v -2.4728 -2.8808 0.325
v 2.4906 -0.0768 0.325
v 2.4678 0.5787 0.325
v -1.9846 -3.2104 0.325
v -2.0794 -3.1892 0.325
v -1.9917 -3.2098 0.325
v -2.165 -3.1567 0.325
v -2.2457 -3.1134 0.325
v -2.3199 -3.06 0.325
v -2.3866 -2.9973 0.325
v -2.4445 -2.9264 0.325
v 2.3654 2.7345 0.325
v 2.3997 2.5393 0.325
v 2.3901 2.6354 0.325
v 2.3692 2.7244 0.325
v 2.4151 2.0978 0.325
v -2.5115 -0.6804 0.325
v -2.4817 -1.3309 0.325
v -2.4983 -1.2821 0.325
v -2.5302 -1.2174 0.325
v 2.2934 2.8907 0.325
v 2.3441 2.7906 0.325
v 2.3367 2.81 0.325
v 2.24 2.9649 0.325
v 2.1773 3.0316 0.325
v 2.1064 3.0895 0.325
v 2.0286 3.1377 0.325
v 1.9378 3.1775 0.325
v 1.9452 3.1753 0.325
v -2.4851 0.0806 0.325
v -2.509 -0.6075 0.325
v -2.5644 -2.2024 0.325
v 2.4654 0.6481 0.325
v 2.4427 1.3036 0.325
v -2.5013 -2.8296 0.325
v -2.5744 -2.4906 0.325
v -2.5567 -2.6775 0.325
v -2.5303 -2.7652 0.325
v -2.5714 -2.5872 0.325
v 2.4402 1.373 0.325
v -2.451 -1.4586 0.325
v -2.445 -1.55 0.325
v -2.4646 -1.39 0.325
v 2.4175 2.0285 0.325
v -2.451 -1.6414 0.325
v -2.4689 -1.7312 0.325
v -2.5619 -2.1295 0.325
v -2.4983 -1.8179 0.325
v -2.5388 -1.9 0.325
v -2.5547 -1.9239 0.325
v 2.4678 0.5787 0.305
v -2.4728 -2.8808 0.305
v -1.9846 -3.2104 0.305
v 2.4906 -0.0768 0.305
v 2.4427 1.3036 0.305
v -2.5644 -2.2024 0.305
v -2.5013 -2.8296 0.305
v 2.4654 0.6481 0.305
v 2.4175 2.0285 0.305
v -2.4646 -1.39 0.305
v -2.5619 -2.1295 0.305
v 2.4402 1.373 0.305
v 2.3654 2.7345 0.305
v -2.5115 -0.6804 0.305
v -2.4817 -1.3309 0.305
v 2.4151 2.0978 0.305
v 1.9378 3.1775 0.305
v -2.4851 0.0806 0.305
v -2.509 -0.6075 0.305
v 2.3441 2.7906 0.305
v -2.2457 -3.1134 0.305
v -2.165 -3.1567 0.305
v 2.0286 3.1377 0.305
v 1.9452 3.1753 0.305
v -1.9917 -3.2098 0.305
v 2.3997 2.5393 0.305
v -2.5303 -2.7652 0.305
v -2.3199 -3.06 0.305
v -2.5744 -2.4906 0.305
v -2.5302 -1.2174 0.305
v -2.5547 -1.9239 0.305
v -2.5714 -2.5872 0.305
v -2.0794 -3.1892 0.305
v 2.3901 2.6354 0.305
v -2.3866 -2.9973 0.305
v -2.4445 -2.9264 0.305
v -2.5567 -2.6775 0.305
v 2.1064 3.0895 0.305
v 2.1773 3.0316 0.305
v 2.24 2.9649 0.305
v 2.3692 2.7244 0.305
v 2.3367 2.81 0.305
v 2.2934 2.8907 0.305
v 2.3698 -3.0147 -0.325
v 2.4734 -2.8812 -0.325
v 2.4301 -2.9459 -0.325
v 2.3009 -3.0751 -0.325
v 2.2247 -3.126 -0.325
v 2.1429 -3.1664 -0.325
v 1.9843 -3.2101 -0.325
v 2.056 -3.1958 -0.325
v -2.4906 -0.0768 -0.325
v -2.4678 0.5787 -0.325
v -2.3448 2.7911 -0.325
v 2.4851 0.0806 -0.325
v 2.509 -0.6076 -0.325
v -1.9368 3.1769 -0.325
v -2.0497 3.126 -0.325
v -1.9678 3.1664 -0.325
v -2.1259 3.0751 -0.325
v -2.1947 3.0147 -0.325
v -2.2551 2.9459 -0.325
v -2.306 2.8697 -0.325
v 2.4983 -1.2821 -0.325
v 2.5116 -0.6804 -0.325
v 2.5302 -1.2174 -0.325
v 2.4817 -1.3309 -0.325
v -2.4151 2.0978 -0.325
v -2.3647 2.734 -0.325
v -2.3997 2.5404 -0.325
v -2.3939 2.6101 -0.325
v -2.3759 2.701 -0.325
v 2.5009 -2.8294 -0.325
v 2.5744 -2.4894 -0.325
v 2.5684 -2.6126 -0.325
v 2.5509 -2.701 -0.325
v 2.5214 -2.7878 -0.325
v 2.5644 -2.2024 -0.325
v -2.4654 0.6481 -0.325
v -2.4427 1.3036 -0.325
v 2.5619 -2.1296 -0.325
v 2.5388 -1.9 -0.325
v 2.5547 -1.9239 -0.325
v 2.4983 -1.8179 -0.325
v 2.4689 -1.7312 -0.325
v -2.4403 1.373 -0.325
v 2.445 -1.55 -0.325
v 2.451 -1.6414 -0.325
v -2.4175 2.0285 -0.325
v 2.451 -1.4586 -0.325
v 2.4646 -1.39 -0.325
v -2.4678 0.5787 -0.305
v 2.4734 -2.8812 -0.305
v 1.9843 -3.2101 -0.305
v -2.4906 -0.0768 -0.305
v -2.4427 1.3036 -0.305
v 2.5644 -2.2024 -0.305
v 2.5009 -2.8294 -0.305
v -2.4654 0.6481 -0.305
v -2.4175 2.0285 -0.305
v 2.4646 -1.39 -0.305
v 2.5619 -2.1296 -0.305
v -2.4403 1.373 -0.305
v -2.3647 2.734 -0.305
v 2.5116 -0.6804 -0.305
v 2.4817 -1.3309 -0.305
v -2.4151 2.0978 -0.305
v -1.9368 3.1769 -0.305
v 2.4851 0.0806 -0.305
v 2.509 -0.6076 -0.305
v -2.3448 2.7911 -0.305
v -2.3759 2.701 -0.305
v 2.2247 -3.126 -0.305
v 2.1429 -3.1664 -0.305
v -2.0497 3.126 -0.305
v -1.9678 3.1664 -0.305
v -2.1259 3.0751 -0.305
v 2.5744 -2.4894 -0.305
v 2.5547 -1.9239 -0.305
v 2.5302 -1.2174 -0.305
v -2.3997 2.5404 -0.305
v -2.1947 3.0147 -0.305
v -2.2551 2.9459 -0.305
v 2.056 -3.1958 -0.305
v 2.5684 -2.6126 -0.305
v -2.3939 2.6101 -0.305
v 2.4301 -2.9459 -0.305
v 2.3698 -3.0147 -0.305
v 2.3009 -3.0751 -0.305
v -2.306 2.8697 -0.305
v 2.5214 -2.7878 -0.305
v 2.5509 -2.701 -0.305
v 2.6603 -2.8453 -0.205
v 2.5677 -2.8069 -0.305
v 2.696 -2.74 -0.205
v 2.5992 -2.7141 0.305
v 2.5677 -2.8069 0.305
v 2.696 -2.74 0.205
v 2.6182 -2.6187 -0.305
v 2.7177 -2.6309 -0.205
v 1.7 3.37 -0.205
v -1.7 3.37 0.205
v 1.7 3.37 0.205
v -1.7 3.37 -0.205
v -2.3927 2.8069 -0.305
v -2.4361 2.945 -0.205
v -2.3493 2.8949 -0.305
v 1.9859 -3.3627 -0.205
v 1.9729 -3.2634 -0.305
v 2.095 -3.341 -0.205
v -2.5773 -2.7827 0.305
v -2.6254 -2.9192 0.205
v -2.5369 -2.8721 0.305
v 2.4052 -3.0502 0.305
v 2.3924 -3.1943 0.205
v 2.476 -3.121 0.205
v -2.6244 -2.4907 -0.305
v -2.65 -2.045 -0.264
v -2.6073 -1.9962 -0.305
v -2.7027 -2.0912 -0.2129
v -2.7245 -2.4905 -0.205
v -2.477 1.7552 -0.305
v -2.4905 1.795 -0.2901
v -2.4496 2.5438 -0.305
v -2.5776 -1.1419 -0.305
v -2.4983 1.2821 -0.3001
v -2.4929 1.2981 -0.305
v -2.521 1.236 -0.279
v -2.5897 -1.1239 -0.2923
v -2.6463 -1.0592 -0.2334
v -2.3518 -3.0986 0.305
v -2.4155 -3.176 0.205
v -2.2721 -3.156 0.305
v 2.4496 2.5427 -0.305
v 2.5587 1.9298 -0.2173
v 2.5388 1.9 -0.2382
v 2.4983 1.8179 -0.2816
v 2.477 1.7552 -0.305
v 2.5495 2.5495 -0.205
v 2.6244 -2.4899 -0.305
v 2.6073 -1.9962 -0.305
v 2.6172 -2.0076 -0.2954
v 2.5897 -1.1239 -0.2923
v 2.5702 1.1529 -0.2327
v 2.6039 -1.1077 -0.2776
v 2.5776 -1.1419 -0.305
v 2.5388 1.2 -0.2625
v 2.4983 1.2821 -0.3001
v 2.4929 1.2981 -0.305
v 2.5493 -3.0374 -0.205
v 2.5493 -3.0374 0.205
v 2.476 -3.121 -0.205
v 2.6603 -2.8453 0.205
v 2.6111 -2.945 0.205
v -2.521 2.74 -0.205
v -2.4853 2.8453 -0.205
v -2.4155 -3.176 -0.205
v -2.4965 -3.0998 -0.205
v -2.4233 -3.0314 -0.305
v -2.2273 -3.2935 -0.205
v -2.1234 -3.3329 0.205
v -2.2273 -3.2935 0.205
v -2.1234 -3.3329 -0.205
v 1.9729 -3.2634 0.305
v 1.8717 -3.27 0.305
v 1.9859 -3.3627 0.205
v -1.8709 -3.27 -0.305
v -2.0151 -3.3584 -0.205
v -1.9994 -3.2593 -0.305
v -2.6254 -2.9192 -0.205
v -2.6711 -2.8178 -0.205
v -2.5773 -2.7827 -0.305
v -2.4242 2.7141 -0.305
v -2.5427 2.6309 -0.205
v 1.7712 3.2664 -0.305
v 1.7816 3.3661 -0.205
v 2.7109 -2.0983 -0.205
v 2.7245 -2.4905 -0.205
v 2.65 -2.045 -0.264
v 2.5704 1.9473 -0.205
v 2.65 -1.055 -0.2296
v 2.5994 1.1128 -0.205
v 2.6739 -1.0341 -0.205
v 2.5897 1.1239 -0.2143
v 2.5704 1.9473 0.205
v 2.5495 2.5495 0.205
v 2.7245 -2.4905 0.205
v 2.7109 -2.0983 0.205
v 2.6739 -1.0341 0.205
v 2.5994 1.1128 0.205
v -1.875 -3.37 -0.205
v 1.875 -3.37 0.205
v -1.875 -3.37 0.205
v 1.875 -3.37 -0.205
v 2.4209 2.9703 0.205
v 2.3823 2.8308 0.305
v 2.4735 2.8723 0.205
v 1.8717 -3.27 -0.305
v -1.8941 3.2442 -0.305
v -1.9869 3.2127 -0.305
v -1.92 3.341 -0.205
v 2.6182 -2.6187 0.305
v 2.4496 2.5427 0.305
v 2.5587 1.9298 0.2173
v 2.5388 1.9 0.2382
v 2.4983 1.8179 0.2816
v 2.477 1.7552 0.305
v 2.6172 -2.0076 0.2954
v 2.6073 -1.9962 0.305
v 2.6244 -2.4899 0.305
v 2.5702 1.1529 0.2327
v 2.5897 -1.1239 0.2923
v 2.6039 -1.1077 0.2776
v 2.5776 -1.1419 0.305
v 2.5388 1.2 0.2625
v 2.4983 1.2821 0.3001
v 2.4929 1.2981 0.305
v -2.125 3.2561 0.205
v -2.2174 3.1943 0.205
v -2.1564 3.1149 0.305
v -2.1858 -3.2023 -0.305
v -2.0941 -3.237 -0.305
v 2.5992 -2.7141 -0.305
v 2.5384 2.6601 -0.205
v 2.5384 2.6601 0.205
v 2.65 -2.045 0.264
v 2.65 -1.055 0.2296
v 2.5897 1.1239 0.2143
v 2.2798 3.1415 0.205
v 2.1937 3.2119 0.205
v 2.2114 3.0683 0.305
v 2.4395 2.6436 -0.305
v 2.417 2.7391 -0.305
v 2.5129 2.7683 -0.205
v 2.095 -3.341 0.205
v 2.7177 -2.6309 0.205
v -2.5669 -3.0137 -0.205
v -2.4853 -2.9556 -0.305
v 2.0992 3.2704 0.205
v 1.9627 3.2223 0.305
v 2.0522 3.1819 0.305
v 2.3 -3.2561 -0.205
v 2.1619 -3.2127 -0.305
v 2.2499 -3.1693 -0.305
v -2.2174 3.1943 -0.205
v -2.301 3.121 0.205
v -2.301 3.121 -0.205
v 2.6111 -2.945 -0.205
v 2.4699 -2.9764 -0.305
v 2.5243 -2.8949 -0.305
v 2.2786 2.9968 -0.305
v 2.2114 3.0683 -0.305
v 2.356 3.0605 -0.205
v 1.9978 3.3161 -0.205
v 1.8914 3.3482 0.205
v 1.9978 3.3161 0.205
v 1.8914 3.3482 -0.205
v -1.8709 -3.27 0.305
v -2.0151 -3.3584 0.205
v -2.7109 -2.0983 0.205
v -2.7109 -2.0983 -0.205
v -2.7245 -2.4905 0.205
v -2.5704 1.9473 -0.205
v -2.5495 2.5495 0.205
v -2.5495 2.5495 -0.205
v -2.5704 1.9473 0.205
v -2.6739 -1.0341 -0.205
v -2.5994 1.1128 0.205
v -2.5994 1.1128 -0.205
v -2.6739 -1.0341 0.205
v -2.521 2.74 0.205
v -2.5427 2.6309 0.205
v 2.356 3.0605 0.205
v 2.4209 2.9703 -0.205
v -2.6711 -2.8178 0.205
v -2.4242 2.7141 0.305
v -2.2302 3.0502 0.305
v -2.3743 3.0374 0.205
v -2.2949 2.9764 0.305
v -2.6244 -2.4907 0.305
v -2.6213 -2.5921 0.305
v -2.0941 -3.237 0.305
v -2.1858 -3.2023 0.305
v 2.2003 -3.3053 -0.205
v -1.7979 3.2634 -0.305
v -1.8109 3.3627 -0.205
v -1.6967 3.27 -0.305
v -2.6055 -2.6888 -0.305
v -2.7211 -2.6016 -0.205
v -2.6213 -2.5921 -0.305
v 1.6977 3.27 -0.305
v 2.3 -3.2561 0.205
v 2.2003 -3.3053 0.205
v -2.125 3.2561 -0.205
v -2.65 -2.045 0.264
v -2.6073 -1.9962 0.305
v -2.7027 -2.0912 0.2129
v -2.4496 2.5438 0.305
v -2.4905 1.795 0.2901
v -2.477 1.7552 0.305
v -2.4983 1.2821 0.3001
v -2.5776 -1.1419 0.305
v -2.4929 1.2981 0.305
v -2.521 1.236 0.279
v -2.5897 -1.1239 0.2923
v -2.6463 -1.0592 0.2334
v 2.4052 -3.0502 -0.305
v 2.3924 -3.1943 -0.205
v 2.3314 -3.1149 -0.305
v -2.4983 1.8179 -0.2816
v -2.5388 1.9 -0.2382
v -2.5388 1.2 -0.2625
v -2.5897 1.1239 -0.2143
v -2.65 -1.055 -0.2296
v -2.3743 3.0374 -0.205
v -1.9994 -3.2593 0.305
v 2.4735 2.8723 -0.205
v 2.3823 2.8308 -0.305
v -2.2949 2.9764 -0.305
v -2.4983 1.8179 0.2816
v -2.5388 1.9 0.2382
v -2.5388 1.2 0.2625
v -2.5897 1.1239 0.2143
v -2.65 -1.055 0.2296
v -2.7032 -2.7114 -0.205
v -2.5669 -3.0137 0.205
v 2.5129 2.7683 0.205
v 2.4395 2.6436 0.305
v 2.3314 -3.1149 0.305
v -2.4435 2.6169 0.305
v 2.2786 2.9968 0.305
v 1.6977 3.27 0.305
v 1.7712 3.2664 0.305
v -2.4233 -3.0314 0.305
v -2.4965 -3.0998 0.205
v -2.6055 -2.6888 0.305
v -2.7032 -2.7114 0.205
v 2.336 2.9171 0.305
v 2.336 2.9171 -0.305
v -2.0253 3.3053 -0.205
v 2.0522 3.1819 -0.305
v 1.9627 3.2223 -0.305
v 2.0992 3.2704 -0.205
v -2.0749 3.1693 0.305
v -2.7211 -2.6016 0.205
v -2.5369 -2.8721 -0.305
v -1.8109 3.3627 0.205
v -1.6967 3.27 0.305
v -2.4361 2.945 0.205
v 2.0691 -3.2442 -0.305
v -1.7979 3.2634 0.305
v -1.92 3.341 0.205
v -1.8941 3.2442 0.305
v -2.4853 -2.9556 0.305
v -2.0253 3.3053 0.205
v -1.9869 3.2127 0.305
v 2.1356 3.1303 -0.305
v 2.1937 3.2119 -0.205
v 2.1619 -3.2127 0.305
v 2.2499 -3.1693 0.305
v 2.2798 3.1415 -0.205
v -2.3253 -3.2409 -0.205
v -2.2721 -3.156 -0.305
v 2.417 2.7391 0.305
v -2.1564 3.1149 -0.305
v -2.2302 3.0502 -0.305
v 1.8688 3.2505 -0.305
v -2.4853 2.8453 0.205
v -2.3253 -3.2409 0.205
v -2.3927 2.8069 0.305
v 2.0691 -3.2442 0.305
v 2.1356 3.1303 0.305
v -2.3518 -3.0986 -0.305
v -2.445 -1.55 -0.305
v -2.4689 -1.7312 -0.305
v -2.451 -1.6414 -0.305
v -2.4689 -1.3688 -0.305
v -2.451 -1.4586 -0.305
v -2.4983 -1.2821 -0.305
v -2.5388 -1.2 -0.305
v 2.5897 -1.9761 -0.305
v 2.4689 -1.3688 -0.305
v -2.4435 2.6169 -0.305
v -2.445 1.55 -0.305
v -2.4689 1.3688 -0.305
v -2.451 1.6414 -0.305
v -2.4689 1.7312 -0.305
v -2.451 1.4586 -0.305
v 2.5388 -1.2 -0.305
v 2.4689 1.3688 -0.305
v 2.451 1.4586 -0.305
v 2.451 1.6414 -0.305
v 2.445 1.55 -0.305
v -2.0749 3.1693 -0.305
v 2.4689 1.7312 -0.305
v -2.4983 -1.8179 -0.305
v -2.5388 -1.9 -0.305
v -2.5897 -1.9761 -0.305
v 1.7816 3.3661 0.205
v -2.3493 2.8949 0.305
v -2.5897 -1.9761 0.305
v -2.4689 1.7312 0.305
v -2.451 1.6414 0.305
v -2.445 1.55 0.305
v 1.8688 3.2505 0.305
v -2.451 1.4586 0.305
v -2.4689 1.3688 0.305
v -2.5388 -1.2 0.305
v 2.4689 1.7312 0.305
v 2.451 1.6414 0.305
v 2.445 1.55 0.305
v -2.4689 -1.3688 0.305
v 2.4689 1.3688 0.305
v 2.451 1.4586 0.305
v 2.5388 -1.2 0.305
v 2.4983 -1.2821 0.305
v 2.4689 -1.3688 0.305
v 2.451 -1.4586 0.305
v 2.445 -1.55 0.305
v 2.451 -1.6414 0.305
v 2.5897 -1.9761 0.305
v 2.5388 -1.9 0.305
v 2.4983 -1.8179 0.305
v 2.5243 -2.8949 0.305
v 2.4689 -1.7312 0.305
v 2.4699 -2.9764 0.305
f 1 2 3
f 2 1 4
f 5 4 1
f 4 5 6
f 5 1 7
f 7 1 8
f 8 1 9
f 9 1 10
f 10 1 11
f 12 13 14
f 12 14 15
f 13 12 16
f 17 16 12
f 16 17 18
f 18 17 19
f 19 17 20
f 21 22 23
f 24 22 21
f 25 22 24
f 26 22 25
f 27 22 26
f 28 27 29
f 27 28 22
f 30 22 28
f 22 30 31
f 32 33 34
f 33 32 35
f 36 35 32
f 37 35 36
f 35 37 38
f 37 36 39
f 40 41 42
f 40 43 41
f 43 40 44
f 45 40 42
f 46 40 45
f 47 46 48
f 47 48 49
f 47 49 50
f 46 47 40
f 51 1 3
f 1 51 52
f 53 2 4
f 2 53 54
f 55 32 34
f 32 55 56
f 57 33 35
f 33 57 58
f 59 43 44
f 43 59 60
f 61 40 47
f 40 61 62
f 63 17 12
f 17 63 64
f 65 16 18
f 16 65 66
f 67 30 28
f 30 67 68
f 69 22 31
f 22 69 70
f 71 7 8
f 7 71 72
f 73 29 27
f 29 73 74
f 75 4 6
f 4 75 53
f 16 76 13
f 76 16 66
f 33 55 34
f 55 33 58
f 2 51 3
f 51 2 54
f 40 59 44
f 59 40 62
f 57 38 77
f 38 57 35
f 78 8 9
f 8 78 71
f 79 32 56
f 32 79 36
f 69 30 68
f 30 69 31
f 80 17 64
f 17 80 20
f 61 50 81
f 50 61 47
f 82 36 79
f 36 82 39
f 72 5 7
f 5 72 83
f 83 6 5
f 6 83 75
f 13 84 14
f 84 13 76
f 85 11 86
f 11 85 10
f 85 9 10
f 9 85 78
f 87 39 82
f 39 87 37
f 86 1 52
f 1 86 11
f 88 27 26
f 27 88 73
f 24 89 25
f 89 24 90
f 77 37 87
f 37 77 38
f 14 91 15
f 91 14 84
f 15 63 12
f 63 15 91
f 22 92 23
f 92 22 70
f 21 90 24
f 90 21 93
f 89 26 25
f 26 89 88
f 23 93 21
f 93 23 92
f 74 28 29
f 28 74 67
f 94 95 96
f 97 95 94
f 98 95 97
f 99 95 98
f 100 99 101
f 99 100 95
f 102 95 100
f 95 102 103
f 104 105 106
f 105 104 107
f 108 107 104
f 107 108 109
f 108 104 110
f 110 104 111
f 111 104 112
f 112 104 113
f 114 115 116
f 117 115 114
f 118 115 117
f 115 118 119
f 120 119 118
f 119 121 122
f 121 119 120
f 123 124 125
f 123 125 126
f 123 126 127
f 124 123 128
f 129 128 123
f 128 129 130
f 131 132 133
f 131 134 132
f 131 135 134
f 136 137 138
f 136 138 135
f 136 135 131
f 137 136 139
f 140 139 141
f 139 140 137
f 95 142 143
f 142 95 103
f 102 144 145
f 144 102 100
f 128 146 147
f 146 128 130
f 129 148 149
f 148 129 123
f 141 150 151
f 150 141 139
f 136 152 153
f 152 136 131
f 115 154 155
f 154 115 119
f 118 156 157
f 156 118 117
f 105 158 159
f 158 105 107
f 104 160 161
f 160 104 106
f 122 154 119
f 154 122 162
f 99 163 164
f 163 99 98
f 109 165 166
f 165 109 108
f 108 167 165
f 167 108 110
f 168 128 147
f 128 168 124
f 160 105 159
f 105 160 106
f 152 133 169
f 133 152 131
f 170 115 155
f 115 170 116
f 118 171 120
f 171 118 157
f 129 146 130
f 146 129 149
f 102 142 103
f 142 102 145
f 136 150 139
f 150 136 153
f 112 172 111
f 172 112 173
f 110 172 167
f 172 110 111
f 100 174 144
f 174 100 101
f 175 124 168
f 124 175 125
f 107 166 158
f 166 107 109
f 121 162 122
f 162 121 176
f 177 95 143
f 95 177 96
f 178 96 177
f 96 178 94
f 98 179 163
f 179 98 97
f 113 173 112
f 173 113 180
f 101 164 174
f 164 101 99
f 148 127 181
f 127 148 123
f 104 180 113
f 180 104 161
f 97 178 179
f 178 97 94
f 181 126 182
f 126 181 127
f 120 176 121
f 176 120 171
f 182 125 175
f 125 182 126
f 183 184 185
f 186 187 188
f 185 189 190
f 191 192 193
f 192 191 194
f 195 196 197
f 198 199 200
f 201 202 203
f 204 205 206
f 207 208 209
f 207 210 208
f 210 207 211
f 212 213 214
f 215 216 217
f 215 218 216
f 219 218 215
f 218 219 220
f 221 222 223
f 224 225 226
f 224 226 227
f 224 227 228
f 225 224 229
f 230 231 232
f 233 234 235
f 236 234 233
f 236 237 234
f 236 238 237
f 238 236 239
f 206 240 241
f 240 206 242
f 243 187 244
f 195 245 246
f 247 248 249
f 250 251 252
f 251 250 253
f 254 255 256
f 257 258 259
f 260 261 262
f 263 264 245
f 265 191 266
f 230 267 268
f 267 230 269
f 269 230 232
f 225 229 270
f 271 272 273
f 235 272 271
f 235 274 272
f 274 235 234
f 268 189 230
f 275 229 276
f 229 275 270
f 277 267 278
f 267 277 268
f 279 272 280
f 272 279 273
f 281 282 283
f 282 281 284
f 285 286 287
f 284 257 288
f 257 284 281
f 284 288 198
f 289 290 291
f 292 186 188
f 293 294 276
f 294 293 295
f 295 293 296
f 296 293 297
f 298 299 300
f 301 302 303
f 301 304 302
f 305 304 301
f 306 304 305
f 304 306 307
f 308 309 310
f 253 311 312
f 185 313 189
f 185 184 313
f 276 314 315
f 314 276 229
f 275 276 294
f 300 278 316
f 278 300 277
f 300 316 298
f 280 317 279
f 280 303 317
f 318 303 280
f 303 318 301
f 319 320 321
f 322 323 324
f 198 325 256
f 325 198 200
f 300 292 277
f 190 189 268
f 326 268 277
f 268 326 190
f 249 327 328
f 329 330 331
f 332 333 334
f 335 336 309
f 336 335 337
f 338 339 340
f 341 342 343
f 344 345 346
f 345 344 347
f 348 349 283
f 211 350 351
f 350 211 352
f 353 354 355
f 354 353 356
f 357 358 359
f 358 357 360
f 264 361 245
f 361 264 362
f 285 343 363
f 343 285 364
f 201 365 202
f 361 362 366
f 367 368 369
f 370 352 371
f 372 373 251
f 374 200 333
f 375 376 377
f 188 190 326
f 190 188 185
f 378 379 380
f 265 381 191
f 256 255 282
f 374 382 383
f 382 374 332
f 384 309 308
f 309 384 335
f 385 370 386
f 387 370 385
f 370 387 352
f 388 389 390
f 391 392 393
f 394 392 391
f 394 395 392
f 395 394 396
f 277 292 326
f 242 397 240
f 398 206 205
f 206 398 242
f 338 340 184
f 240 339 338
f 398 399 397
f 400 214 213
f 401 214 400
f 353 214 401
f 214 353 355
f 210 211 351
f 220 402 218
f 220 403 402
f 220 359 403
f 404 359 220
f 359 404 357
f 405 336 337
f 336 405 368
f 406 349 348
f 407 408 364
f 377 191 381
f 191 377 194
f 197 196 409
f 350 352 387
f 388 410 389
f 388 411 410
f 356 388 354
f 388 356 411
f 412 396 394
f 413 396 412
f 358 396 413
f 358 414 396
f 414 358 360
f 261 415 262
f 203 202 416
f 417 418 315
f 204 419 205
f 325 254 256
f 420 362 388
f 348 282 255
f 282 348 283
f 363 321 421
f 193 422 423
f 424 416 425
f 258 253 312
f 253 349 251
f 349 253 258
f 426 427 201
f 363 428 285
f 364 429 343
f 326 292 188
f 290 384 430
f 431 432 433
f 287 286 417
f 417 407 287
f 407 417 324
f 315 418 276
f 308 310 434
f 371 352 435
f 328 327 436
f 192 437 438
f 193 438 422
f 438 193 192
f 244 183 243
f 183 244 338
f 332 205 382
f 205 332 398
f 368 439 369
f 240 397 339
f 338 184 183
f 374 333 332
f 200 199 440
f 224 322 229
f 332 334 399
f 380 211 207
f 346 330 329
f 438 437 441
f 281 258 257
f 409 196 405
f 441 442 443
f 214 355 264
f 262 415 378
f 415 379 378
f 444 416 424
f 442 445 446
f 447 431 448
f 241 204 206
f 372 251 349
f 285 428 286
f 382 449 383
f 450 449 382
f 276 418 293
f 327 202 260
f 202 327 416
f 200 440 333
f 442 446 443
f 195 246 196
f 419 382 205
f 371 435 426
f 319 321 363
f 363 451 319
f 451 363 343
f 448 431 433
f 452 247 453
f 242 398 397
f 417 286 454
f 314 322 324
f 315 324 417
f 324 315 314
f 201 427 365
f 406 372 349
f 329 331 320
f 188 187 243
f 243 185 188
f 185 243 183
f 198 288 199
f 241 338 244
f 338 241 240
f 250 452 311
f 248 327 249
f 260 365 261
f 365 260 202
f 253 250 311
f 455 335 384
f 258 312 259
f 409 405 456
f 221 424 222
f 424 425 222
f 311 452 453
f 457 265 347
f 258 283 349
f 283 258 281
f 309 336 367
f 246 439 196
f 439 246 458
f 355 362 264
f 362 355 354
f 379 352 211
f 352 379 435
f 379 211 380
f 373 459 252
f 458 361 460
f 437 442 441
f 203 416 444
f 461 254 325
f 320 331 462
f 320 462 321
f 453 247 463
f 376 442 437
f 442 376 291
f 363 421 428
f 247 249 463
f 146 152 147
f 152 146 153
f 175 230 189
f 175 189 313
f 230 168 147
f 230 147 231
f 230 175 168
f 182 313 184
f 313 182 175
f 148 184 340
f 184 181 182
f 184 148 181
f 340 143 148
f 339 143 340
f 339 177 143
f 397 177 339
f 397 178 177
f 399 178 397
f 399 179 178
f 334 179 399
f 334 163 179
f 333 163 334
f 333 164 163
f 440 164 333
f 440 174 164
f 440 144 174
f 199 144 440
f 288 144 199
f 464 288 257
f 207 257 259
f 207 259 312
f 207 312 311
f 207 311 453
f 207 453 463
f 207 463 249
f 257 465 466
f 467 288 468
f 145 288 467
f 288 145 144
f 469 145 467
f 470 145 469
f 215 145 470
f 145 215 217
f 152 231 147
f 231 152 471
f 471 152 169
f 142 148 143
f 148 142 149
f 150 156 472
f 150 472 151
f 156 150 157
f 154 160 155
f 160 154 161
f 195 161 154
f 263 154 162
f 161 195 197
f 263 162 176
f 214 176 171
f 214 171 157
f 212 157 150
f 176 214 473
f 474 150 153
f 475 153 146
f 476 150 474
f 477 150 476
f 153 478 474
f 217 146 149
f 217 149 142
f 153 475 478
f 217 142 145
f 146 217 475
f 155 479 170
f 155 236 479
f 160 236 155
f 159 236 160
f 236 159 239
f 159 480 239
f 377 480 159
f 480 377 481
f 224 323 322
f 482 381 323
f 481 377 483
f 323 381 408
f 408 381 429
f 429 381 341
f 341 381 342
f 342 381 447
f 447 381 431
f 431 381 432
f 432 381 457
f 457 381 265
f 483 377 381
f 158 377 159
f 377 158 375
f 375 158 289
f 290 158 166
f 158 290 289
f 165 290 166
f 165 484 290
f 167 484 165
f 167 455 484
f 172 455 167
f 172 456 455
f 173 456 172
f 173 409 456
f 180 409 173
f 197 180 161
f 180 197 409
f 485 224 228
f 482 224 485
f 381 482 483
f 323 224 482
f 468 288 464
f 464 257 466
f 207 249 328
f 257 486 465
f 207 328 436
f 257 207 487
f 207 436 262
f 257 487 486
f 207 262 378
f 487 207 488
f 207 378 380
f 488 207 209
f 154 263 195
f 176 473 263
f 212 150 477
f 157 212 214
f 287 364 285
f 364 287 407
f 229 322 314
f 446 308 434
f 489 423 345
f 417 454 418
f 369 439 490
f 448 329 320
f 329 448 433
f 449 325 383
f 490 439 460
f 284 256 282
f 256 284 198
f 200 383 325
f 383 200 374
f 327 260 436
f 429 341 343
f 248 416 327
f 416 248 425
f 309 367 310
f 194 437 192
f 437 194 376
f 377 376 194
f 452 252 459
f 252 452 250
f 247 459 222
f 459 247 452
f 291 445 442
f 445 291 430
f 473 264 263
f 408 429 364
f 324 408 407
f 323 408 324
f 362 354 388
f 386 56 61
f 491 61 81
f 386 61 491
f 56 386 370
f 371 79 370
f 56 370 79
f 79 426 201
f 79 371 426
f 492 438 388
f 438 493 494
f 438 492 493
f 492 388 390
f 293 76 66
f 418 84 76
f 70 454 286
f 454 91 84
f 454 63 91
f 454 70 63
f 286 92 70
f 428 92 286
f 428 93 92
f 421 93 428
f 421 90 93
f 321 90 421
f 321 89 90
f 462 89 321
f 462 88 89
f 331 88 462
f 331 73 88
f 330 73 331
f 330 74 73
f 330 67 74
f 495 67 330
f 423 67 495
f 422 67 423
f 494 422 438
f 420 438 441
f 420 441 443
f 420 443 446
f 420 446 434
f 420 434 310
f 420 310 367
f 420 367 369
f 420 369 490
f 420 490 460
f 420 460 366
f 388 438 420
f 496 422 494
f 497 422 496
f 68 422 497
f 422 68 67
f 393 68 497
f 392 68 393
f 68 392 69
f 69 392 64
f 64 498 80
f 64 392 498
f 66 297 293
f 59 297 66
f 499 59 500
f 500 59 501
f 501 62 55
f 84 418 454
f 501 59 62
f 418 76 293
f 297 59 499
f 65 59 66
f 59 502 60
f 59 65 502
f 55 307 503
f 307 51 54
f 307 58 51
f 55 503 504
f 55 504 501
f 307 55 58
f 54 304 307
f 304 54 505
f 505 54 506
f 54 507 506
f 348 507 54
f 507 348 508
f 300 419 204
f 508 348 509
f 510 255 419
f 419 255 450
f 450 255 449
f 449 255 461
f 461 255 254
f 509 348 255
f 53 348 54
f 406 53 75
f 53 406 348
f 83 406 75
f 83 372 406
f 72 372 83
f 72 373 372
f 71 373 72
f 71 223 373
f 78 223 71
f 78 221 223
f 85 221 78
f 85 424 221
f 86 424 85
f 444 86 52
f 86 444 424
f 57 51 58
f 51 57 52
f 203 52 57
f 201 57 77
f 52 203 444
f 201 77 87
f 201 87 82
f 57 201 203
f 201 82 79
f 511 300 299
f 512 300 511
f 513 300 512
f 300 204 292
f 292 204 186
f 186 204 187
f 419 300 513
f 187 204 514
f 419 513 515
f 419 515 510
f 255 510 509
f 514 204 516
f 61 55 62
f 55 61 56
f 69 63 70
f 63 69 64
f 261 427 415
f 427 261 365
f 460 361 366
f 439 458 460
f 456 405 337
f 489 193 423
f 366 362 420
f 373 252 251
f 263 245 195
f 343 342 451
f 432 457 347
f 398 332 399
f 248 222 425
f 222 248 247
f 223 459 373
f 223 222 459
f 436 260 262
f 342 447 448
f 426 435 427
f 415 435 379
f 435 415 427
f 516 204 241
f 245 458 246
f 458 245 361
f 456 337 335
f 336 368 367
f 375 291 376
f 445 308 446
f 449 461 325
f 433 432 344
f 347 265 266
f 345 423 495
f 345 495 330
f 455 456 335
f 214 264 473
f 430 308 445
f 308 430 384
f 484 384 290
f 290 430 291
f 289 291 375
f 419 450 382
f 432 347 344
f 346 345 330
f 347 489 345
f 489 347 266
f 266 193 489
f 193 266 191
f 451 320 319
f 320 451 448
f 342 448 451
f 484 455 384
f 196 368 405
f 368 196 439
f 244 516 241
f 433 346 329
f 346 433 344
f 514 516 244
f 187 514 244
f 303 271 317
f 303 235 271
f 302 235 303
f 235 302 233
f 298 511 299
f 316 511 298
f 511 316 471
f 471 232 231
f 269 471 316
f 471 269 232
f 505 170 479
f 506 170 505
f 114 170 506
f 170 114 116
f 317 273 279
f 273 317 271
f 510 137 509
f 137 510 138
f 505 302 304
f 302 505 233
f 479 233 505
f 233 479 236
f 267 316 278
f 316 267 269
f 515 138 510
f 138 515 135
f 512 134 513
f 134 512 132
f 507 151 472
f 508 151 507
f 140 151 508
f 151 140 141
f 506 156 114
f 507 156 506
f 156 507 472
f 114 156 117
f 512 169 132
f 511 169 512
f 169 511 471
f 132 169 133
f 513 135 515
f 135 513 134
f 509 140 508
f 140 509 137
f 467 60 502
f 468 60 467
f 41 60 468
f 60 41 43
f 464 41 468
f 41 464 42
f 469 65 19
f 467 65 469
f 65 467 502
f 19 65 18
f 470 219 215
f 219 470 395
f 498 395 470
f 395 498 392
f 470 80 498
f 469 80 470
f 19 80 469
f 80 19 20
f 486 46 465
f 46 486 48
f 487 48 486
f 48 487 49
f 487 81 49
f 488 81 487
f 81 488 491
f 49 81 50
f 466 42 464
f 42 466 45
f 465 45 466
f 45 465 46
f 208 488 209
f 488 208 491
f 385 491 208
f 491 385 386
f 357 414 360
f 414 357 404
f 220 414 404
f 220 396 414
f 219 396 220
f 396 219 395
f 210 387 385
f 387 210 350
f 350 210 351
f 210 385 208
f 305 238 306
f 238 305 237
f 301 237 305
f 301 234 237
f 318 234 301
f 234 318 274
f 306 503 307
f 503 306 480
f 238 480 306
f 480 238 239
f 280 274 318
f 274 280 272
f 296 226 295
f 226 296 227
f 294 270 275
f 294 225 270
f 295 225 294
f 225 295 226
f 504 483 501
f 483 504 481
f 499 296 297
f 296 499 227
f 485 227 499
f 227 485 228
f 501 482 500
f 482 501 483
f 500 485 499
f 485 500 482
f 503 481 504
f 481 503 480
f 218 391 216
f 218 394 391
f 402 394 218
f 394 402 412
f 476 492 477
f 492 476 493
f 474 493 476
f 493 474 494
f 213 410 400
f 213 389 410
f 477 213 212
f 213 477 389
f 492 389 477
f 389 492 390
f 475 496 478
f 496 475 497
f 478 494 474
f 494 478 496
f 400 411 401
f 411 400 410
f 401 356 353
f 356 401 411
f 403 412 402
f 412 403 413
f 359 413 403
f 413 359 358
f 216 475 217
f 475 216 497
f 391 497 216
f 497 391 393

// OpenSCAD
// Thin tapered rounded-rectangle plate with shallow side scallops and subtle diagonal relief
// Target bounding box: X=5.45, Y=6.74, Z=0.61 (mm)  (elongated along Y)
// Render-safe: no minkowski(), moderate $fn, connected solid.

$fn = 48;

// Parameters (mm)
L = 6.74;   // length (elongated axis, Y)
W = 5.45;   // width (X)
T = 0.61;   // thickness (Z)

corner_R = 0.85;          // planar corner rounding
taper_delta_W = 0.35;     // width reduction at +Y end (slight taper)

scallop_depth = 0.28;     // shallow bite into side
scallop_R = 0.70;         // scallop radius
scallop_offset_from_center = 1.55; // along length (Y) from center

relief_height = 0.05;     // raised ribs height
relief_band_width = 0.55; // rib band width
relief_angle_deg = 35;    // diagonal angle

edge_chamfer = 0.10;      // simple 3D edge softening (chamfer-like)
eps = 0.02;

// ---------- 2D outline (in XY, length along Y) ----------
module tapered_outline_2d(){
    // width at -Y and +Y
    w0 = W;
    w1 = max(0.5, W - taper_delta_W);

    r = min(corner_R, min(w0, w1)/2 - 0.01);
    baseL = max(0.2, L - 2*r);
    baseW0 = max(0.2, w0 - 2*r);
    baseW1 = max(0.2, w1 - 2*r);

    // Rounded trapezoid via offset on a simple polygon
    offset(r=r)
        polygon(points=[
            [-baseW0/2, -baseL/2],
            [ baseW0/2, -baseL/2],
            [ baseW1/2,  baseL/2],
            [-baseW1/2,  baseL/2]
        ]);
}

// ---------- 3D helpers ----------
module scallop_cutter(){
    cylinder(r=scallop_R, h=T + 6*eps, center=true);
}

module rib(){
    cube([max(W,L)*2.0, relief_band_width, relief_height], center=true);
}

// Simple chamfered plate by hulling two extrusions (fast, no minkowski)
module plate_chamfered(){
    c = min(edge_chamfer, T/2 - 0.001);
    if (c <= 0){
        linear_extrude(height=T, center=true, convexity=6) tapered_outline_2d();
    } else {
        hull(){
            // middle (full size)
            linear_extrude(height=max(0.001, T - 2*c), center=true, convexity=6)
                tapered_outline_2d();

            // top & bottom slightly inset to create a chamfer-like edge
            translate([0,0, (T/2 - c/2)])
                linear_extrude(height=c, center=true, convexity=6)
                    offset(delta=-c) tapered_outline_2d();

            translate([0,0, -(T/2 - c/2)])
                linear_extrude(height=c, center=true, convexity=6)
                    offset(delta=-c) tapered_outline_2d();
        }
    }
}

// ---------- Model ----------
module model(){
    difference(){
        union(){
            plate_chamfered();

            // Subtle diagonal ribs on both faces (raised, shallow)
            // Keep ribs within the plate footprint by intersecting with a thin slab.
            intersection(){
                union(){
                    for (k = [-2,-1,0,1,2]){
                        translate([0, k*relief_band_width*1.35,  T/2 - relief_height/2 + eps])
                            rotate([0,0, relief_angle_deg]) rib();
                    }
                }
                // limit to near-top face region
                translate([0,0, T/2 - relief_height/2])
                    linear_extrude(height=relief_height + 2*eps, center=true, convexity=4)
                        offset(delta=-0.15) tapered_outline_2d();
            }

            intersection(){
                union(){
                    for (k = [-2,-1,0,1,2]){
                        translate([0, k*relief_band_width*1.35, -T/2 + relief_height/2 - eps])
                            rotate([0,0,-relief_angle_deg]) rib();
                    }
                }
                // limit to near-bottom face region
                translate([0,0, -T/2 + relief_height/2])
                    linear_extrude(height=relief_height + 2*eps, center=true, convexity=4)
                        offset(delta=-0.15) tapered_outline_2d();
            }
        }

        // Shallow scallops on left/right edges (X sides), two per side along Y
        x_out = W/2 + scallop_R - scallop_depth;

        for (sy = [-1, 1]){
            translate([ x_out, sy*scallop_offset_from_center, 0]) scallop_cutter();
            translate([-x_out, sy*scallop_offset_from_center, 0]) scallop_cutter();
        }
    }
}

model();
